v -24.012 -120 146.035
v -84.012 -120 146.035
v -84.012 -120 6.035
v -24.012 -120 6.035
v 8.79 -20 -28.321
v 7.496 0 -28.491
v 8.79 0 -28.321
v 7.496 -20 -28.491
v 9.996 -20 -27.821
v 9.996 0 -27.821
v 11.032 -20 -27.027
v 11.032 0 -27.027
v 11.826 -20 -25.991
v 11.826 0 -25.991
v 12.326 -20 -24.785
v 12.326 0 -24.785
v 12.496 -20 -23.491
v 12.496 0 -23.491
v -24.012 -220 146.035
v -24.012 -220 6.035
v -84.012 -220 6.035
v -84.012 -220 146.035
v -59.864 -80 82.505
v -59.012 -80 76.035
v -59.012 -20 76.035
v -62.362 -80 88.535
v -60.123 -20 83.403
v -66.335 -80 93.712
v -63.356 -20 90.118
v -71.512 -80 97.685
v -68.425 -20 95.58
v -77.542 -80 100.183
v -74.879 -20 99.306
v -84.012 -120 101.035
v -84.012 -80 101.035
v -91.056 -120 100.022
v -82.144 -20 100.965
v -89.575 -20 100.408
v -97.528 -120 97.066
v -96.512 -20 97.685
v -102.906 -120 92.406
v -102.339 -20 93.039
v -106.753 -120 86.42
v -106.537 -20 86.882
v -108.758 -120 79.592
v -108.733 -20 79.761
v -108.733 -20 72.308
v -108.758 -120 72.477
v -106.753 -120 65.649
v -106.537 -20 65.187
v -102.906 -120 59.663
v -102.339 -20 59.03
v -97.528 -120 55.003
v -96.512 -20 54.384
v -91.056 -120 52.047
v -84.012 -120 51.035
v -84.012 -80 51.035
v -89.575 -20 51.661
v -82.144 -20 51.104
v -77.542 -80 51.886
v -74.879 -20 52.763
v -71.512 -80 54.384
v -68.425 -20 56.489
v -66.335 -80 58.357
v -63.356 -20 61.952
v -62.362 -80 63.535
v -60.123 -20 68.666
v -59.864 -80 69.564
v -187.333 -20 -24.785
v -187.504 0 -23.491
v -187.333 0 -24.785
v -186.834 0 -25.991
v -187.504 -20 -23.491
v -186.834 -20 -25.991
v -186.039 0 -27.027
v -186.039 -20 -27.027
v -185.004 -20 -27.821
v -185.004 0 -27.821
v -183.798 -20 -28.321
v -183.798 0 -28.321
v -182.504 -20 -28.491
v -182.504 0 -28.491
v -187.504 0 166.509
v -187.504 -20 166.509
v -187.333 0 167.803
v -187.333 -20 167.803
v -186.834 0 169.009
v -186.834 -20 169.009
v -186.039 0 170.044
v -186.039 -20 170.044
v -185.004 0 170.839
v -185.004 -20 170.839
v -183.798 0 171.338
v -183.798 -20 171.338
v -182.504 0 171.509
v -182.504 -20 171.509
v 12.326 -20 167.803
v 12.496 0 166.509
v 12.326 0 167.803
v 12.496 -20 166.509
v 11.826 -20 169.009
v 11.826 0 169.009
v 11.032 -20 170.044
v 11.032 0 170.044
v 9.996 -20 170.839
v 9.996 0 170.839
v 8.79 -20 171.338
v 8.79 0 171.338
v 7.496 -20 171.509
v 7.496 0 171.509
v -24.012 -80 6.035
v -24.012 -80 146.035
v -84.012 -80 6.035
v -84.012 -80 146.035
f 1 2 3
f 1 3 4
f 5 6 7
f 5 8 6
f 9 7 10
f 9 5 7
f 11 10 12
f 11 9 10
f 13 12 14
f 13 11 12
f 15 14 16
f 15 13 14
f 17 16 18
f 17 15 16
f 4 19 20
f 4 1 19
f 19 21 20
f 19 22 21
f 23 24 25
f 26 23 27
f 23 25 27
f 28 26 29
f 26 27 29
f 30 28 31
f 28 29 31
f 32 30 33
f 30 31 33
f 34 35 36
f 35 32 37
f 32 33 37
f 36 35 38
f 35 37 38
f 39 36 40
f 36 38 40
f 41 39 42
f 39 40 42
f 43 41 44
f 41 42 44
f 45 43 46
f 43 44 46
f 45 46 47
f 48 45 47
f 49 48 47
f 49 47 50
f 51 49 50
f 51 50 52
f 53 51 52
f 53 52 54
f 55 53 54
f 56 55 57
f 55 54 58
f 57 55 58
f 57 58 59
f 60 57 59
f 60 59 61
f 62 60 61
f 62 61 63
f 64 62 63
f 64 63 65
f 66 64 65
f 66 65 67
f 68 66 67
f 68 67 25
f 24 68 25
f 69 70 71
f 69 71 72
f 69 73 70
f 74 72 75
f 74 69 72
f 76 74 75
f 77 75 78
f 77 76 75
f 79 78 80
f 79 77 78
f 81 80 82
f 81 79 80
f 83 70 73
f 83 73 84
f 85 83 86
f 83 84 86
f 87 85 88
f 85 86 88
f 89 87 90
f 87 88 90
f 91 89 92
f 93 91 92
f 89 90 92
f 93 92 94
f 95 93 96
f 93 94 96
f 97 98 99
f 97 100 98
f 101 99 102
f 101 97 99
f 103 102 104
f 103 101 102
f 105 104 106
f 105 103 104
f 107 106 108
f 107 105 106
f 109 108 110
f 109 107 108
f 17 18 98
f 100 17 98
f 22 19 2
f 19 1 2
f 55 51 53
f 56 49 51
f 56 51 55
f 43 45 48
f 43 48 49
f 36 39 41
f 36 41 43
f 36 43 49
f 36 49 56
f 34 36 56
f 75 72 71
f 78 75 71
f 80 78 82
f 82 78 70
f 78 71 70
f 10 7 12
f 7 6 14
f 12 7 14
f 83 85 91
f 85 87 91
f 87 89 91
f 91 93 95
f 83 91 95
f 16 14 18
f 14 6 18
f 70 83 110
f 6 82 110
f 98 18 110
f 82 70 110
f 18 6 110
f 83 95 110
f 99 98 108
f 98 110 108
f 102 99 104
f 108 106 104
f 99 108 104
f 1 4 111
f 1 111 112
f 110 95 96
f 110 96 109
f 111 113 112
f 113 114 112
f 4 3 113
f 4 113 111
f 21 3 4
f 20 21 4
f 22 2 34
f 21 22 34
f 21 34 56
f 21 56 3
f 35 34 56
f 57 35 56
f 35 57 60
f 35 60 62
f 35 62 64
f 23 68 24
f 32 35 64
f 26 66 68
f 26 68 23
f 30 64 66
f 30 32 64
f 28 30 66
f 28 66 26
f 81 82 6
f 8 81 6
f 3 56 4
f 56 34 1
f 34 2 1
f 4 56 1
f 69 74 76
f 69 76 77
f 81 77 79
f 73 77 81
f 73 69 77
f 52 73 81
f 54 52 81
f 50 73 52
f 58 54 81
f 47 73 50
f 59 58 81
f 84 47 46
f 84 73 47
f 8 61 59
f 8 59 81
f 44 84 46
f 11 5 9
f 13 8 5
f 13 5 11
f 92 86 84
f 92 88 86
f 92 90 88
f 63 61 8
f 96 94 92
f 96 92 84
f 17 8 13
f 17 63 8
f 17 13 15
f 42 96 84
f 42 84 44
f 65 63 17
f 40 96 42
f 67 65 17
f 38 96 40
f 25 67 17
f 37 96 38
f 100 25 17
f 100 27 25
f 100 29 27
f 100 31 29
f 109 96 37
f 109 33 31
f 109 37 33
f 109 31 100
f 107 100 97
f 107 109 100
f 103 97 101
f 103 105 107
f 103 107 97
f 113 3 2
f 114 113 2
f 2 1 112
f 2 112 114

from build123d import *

# Parameters (mm, degrees)
F0_W      = 200
F0_H      = 200
F1_DEPTH  = 20
F2_R      = 5
F3_R      = 25
F4_DEPTH  = 100
F6_DEPTH  = 40
F8_DEPTH  = 50
F9_DEPTH  = 50
F10_DEPTH = 40
F11_DEPTH = 50


with BuildPart() as f1:
    # F0 (on Front) → F1 (new body)
    with BuildSketch(Plane.XZ):
        with Locations((-87.5037372112, 71.5086780488)):
            Rectangle(F0_W, F0_H)
    extrude(amount=F1_DEPTH)

    # F2
    f2_edges = [f1.edges().sort_by_distance(p)[0] for p in [
        (12.496263, -10, 171.508678),
        (-187.503737, -10, 171.508678),
        (-187.503737, -10, -28.491322),
        (12.496263, -10, -28.491322),
    ]]
    fillet(f2_edges, radius=F2_R)

    # F3 (on face) → F4 (join)
    with BuildSketch(Plane.XZ.offset(20)):
        with Locations((-84.0123593807, 76.0345458984)):
            Circle(F3_R)
    extrude(amount=F4_DEPTH)

    # F5 (on face) → F6 (cut)
    with BuildSketch(Plane.XZ.offset(120)):
        with BuildLine():
            Line((-59.0123593807, 76.0345458984), (-84.0123593807, 76.0345458984))
            Line((-84.0123593807, 76.0345458984), (-84.0123593807, 51.0345458984))
            ThreePointArc((-84.0123593807, 51.0345458984), (-66.3346898511, 58.3568763688), (-59.0123593807, 76.0345458984))
        make_face()
        with BuildLine():
            Line((-84.0123593807, 101.0345458984), (-84.0123593807, 76.0345458984))
            Line((-84.0123593807, 76.0345458984), (-59.0123593807, 76.0345458984))
            ThreePointArc((-59.0123593807, 76.0345458984), (-66.3346898511, 93.7122154281), (-84.0123593807, 101.0345458984))
        make_face()
    extrude(amount=-F6_DEPTH, mode=Mode.SUBTRACT)



with BuildPart() as f8:
    # F7 (on face) → F8 (new body)
    with BuildSketch(Plane.XZ.offset(120)):
        Polygon((-24.0123593807, 76.0345458984), (-84.0123593807, 76.0345458984), (-84.0123593807, 51.0345458984), (-84.0123593807, 6.0345458984), (-24.0123593807, 6.0345458984), align=None)
    extrude(amount=F8_DEPTH)


with BuildPart() as f1_1:
    add(f1.part)

    add(f8.part)  # F9 merges F8
    # F7 (on face) → F9 (join)
    with BuildSketch(Plane.XZ.offset(120)):
        Polygon((-24.0123593807, 76.0345458984), (-84.0123593807, 76.0345458984), (-84.0123593807, 51.0345458984), (-84.0123593807, 6.0345458984), (-24.0123593807, 6.0345458984), align=None)
        Polygon((-84.0123593807, 101.0345458984), (-84.0123593807, 76.0345458984), (-24.0123593807, 76.0345458984), (-24.0123593807, 146.0345458984), (-84.0123593807, 146.0345458984), align=None)
    extrude(amount=F9_DEPTH)


with BuildPart() as f10:
    # F10 (new): a face of the model
    f10_faces = [f1_1.part.faces().sort_by_distance(p)[0] for p in [
        (-54.0123593807, -120, 76.0345458984),
    ]]
    extrude(f10_faces, amount=F10_DEPTH)


with BuildPart() as f1_2:
    add(f1_1.part)

    # F11 (add): a face of the model
    f11_faces = [f1_2.faces().sort_by_distance(p)[0] for p in [
        (-54.0123593807, -170, 76.0345458984),
    ]]
    extrude(f11_faces, amount=F11_DEPTH)


solid = Compound([f10.part, f1_2.part])
